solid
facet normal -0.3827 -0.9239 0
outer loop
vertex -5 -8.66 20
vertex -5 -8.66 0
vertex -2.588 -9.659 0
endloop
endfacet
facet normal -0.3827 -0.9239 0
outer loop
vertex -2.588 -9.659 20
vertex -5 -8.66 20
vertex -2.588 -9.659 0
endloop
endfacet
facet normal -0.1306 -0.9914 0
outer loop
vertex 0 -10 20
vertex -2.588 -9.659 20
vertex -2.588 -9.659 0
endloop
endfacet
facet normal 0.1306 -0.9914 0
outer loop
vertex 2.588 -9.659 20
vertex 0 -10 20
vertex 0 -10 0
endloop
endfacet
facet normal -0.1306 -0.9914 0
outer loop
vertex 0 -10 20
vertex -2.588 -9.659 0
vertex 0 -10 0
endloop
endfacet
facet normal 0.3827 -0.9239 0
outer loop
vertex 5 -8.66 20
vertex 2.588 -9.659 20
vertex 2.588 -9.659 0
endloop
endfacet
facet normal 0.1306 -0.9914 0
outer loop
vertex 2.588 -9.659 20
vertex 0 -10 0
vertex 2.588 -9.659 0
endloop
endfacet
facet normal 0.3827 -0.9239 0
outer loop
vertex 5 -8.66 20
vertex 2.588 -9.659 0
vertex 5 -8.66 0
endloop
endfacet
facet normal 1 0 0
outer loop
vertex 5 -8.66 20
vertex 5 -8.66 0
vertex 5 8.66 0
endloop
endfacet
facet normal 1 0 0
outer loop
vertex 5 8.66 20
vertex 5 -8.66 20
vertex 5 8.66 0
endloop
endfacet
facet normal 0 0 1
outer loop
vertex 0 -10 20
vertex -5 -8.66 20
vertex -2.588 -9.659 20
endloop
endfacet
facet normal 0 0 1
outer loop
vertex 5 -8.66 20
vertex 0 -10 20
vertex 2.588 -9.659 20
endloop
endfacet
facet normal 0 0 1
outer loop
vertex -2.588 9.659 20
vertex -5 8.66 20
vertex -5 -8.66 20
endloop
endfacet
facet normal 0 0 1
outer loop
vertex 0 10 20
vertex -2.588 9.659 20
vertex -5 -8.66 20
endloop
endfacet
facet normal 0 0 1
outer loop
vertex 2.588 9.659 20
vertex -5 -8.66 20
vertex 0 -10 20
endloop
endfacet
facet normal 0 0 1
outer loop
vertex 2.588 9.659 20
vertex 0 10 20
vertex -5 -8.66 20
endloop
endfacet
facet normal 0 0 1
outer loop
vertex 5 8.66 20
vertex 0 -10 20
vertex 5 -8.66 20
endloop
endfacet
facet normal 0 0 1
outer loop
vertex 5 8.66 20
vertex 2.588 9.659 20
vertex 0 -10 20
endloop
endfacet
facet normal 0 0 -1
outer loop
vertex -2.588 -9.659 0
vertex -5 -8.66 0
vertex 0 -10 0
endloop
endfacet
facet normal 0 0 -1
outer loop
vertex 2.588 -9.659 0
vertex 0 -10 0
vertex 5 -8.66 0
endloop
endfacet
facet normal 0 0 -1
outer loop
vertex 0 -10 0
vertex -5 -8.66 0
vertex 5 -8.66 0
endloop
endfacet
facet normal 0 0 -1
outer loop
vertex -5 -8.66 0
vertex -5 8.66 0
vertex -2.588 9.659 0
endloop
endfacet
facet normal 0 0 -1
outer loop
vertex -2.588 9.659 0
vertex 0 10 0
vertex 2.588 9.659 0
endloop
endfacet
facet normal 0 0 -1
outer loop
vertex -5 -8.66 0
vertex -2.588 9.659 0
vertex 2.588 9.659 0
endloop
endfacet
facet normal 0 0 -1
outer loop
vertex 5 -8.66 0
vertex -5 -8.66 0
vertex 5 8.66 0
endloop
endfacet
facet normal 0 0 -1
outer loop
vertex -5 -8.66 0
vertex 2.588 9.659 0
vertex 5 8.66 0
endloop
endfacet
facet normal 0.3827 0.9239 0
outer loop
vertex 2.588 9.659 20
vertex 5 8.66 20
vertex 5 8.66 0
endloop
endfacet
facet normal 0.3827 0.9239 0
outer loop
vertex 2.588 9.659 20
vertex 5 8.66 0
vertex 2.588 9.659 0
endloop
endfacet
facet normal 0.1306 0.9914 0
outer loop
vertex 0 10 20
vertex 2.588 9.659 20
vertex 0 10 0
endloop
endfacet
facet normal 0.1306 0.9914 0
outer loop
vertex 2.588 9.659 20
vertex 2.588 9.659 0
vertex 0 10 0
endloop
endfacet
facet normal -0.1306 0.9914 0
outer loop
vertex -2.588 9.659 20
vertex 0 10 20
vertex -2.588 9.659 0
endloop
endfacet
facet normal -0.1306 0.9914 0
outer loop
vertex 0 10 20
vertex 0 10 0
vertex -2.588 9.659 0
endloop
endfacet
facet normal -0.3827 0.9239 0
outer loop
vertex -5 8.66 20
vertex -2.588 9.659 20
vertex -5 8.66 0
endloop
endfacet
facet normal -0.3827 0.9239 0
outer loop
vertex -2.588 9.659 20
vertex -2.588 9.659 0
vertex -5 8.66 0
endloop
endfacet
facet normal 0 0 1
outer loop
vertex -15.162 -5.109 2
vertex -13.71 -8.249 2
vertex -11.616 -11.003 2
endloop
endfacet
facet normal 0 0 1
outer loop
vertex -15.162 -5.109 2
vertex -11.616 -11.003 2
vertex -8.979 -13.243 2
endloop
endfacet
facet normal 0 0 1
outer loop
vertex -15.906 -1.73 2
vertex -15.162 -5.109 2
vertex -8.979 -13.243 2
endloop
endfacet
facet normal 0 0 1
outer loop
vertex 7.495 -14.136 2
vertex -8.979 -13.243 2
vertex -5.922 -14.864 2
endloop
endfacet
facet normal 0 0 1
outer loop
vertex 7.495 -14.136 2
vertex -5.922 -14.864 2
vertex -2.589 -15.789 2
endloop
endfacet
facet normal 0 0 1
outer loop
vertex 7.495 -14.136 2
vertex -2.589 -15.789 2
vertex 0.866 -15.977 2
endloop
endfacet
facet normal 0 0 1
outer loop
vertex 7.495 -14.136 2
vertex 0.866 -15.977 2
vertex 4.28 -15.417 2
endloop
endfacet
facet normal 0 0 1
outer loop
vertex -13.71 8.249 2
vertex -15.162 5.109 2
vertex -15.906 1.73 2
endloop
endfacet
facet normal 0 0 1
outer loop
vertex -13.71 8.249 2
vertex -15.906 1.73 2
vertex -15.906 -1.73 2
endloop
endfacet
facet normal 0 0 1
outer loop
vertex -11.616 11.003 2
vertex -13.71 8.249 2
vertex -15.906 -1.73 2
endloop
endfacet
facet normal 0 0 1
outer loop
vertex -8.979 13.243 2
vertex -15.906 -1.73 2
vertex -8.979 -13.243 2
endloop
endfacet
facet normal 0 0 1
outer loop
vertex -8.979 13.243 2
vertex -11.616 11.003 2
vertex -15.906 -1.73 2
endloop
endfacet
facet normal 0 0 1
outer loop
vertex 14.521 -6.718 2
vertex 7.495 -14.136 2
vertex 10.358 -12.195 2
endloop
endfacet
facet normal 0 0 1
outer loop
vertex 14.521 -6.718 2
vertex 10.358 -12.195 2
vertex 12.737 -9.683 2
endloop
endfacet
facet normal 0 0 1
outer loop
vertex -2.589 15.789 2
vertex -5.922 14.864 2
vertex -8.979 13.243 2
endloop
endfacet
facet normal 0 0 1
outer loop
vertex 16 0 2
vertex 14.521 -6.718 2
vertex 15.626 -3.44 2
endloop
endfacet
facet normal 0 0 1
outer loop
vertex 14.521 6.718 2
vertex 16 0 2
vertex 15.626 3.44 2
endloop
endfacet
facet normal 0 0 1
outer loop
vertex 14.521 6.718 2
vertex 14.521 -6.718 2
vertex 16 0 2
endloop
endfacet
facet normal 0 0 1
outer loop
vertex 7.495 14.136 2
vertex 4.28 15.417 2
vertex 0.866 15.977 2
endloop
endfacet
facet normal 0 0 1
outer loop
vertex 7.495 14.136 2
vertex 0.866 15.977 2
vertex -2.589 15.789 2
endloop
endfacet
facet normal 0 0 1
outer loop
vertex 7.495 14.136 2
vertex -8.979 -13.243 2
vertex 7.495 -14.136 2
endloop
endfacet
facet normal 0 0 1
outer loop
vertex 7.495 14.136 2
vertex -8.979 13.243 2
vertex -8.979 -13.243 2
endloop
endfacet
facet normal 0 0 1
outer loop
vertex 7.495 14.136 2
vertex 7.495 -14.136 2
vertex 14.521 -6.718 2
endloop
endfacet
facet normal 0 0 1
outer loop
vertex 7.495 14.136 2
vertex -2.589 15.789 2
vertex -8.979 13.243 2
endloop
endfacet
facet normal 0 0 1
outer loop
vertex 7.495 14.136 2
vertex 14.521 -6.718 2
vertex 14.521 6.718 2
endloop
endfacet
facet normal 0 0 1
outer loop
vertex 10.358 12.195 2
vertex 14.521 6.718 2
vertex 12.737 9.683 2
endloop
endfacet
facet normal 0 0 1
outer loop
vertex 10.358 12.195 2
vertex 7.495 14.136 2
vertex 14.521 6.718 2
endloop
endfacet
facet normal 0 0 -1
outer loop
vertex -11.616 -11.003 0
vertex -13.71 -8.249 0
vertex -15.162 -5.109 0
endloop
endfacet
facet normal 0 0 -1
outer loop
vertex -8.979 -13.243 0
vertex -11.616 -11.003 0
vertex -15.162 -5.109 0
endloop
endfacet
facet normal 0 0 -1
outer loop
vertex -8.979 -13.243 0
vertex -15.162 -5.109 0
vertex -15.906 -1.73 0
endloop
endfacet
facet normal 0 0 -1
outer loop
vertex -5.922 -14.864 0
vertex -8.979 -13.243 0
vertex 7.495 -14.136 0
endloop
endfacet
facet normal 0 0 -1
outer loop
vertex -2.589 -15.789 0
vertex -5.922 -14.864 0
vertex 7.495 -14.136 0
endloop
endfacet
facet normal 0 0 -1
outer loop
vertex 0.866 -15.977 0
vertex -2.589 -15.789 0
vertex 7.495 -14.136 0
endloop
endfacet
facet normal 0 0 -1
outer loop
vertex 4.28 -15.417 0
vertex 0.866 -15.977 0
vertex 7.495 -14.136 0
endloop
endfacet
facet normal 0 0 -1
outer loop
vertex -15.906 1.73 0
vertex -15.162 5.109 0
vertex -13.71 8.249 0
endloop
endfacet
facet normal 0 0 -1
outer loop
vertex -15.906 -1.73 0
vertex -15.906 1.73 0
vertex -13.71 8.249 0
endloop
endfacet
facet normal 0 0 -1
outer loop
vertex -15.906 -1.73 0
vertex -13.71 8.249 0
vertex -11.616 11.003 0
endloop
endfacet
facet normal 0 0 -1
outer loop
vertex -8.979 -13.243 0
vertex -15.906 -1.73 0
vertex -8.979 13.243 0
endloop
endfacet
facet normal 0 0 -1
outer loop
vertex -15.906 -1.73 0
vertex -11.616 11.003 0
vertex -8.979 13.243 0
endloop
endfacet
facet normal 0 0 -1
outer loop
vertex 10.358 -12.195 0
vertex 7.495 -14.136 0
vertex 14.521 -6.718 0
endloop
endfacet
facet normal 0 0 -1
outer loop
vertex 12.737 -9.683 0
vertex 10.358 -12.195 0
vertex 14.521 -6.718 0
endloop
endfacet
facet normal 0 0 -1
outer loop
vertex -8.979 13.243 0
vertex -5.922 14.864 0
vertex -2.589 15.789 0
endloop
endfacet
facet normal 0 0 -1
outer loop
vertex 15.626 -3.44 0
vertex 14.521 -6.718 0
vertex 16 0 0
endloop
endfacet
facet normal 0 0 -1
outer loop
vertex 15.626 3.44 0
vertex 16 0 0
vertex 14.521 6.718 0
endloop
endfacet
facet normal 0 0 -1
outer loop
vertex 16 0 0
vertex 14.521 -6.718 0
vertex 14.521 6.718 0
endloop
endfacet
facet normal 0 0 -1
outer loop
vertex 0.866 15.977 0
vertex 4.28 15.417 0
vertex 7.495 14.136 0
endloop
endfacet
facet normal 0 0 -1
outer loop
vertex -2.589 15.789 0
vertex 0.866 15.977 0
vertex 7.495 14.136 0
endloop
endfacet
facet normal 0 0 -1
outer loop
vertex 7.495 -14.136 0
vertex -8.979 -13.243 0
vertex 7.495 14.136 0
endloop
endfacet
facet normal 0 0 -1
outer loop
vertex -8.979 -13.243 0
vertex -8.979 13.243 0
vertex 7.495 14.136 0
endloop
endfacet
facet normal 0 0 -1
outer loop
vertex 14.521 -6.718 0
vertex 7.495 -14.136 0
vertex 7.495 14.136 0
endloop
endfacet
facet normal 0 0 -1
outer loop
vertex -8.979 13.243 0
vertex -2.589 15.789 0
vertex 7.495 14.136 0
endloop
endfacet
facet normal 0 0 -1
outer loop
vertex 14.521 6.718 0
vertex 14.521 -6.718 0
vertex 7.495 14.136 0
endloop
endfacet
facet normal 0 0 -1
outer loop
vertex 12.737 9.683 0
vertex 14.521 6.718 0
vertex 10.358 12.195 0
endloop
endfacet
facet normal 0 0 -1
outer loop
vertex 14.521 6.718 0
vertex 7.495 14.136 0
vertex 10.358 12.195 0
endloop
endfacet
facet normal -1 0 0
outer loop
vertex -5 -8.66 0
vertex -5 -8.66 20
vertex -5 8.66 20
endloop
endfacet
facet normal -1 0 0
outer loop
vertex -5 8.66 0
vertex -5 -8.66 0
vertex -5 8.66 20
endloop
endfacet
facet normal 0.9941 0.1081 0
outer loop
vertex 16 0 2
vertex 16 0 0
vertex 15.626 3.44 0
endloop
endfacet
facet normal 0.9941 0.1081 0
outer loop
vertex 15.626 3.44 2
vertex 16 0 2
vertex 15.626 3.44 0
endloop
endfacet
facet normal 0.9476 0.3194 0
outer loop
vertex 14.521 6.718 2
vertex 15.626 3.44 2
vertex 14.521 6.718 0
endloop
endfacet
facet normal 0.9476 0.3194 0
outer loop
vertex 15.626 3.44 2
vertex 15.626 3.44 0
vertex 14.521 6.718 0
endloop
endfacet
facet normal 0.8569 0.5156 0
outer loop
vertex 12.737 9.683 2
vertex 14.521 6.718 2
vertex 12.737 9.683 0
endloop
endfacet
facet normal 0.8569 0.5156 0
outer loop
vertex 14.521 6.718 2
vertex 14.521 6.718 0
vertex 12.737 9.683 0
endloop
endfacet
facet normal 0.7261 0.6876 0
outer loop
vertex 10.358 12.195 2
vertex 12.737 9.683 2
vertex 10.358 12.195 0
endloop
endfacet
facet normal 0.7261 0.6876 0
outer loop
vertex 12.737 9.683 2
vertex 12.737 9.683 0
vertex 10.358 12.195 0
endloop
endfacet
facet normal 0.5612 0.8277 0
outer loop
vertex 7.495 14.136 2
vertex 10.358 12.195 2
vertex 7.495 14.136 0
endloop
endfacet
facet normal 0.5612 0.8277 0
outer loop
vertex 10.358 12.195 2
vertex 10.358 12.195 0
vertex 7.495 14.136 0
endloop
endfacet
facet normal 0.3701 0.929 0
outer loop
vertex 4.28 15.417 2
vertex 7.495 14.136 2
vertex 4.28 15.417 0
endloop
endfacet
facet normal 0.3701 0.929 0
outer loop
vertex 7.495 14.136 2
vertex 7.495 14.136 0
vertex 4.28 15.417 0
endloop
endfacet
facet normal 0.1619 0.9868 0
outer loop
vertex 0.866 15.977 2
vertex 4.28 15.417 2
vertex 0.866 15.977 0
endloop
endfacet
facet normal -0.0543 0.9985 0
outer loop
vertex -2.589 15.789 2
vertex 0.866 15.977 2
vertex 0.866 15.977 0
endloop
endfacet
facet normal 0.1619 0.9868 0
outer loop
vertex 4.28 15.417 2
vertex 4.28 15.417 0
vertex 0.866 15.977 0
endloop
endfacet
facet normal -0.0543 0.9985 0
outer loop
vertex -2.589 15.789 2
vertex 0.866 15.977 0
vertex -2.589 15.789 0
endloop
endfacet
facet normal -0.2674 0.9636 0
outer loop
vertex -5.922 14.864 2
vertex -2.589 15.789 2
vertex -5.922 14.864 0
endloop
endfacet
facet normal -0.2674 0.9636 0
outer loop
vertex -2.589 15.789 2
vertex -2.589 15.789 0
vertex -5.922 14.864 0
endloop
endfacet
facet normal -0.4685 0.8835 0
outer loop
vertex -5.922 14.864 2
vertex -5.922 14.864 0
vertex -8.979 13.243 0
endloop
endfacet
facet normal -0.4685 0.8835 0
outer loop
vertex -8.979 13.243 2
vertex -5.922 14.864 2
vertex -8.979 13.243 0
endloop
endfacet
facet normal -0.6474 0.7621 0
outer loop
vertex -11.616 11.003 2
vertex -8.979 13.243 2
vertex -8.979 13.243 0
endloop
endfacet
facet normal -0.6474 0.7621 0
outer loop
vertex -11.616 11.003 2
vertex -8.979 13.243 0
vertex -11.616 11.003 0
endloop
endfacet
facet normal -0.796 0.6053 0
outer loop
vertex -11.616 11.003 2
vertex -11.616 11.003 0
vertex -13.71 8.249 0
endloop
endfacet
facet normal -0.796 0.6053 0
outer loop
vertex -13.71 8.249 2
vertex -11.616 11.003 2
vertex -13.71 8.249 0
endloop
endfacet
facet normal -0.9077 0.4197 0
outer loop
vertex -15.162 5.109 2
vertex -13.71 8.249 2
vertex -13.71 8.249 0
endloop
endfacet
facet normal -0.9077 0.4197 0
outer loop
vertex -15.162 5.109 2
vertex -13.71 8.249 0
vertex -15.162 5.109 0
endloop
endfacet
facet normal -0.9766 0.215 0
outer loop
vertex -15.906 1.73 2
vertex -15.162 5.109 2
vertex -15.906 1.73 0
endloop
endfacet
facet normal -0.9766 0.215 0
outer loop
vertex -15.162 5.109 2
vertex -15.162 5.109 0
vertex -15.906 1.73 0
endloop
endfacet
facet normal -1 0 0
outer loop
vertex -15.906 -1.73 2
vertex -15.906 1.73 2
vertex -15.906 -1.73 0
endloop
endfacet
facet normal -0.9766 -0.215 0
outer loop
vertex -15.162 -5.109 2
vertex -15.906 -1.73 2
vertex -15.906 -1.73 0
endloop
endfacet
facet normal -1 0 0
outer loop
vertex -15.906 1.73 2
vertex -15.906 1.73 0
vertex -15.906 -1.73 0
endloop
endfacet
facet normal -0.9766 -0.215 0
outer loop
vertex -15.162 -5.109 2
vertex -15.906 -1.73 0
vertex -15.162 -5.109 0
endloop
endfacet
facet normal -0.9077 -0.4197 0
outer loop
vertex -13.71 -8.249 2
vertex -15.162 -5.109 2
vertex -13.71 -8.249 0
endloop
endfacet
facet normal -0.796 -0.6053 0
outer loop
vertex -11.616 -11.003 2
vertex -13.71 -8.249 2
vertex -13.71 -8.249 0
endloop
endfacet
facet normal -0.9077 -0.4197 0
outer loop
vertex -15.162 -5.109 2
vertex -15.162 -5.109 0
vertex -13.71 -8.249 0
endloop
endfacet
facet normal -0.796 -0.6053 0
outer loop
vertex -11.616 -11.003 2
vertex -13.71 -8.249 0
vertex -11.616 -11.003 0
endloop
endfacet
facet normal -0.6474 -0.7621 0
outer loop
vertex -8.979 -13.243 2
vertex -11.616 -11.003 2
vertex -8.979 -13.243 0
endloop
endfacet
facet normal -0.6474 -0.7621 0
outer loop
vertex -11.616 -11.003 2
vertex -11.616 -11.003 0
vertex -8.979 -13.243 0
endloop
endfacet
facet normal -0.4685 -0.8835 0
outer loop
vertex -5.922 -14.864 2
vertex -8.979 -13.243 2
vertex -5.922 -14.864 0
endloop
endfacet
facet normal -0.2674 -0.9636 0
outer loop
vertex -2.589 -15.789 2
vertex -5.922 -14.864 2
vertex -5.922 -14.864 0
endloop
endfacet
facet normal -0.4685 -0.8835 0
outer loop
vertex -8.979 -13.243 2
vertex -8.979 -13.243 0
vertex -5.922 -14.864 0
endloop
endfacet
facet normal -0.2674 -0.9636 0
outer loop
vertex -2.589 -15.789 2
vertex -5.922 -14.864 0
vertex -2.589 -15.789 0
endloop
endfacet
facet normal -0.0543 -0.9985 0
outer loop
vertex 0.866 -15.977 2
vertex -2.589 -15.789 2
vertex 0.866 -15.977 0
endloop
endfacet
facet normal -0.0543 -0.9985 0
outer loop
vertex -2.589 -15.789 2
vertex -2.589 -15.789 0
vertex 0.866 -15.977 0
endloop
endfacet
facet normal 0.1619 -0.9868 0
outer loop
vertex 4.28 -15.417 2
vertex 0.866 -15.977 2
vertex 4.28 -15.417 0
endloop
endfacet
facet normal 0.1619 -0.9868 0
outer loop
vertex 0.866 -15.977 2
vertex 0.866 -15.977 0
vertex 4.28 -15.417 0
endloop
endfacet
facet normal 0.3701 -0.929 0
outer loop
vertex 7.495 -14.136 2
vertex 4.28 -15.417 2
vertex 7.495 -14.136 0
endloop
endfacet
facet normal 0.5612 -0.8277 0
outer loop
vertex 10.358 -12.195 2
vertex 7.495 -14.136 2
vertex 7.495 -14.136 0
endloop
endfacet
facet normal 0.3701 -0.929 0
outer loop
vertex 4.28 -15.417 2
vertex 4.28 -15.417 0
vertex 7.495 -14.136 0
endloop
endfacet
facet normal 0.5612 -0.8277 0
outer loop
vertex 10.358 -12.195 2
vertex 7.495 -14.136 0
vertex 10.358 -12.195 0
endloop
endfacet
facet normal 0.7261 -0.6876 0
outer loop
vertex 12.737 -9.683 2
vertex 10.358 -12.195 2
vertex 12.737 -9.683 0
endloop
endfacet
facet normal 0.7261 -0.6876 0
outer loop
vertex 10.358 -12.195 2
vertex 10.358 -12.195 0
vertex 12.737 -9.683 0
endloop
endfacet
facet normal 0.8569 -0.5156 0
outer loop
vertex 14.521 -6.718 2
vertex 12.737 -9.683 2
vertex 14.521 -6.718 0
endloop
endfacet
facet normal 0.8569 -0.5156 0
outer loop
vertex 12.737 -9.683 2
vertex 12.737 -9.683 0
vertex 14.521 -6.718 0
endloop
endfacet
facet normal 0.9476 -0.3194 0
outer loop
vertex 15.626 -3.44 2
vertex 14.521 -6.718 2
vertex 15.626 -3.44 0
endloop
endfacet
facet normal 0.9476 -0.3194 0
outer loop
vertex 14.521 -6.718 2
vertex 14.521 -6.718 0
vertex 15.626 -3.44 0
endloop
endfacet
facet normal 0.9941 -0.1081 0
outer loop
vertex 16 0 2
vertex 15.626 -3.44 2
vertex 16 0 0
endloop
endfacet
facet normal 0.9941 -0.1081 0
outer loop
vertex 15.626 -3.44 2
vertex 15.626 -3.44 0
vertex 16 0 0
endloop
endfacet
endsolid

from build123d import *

# Parameters (mm, degrees)
BOX_W             = 10
BOX_H             = 20
BOX_DEPTH         = 20
CYLINDER002_R     = 10
CYLINDER002_DEPTH = 20
CYLINDER_R        = 16
CYLINDER_DEPTH    = 2


with BuildPart() as box:
    # Box → Box (new body)
    with BuildSketch(Plane(origin=(-5, -10, 0), x_dir=(1, 0, 0), z_dir=(0, 0, 1))):
        with Locations((5, 10)):
            Rectangle(BOX_W, BOX_H)
    extrude(amount=BOX_DEPTH)


with BuildPart() as common:
    # Cylinder002 → Cylinder002 (new body)
    with BuildSketch(Plane.XY):
        Circle(CYLINDER002_R)
    extrude(amount=CYLINDER002_DEPTH)

    # Common: intersect Box
    add(box.part, mode=Mode.INTERSECT)


with BuildPart() as cylinder:
    # Cylinder → Cylinder (new body)
    with BuildSketch(Plane.XY):
        Circle(CYLINDER_R)
    extrude(amount=CYLINDER_DEPTH)


solid = Compound([common.part, cylinder.part])
